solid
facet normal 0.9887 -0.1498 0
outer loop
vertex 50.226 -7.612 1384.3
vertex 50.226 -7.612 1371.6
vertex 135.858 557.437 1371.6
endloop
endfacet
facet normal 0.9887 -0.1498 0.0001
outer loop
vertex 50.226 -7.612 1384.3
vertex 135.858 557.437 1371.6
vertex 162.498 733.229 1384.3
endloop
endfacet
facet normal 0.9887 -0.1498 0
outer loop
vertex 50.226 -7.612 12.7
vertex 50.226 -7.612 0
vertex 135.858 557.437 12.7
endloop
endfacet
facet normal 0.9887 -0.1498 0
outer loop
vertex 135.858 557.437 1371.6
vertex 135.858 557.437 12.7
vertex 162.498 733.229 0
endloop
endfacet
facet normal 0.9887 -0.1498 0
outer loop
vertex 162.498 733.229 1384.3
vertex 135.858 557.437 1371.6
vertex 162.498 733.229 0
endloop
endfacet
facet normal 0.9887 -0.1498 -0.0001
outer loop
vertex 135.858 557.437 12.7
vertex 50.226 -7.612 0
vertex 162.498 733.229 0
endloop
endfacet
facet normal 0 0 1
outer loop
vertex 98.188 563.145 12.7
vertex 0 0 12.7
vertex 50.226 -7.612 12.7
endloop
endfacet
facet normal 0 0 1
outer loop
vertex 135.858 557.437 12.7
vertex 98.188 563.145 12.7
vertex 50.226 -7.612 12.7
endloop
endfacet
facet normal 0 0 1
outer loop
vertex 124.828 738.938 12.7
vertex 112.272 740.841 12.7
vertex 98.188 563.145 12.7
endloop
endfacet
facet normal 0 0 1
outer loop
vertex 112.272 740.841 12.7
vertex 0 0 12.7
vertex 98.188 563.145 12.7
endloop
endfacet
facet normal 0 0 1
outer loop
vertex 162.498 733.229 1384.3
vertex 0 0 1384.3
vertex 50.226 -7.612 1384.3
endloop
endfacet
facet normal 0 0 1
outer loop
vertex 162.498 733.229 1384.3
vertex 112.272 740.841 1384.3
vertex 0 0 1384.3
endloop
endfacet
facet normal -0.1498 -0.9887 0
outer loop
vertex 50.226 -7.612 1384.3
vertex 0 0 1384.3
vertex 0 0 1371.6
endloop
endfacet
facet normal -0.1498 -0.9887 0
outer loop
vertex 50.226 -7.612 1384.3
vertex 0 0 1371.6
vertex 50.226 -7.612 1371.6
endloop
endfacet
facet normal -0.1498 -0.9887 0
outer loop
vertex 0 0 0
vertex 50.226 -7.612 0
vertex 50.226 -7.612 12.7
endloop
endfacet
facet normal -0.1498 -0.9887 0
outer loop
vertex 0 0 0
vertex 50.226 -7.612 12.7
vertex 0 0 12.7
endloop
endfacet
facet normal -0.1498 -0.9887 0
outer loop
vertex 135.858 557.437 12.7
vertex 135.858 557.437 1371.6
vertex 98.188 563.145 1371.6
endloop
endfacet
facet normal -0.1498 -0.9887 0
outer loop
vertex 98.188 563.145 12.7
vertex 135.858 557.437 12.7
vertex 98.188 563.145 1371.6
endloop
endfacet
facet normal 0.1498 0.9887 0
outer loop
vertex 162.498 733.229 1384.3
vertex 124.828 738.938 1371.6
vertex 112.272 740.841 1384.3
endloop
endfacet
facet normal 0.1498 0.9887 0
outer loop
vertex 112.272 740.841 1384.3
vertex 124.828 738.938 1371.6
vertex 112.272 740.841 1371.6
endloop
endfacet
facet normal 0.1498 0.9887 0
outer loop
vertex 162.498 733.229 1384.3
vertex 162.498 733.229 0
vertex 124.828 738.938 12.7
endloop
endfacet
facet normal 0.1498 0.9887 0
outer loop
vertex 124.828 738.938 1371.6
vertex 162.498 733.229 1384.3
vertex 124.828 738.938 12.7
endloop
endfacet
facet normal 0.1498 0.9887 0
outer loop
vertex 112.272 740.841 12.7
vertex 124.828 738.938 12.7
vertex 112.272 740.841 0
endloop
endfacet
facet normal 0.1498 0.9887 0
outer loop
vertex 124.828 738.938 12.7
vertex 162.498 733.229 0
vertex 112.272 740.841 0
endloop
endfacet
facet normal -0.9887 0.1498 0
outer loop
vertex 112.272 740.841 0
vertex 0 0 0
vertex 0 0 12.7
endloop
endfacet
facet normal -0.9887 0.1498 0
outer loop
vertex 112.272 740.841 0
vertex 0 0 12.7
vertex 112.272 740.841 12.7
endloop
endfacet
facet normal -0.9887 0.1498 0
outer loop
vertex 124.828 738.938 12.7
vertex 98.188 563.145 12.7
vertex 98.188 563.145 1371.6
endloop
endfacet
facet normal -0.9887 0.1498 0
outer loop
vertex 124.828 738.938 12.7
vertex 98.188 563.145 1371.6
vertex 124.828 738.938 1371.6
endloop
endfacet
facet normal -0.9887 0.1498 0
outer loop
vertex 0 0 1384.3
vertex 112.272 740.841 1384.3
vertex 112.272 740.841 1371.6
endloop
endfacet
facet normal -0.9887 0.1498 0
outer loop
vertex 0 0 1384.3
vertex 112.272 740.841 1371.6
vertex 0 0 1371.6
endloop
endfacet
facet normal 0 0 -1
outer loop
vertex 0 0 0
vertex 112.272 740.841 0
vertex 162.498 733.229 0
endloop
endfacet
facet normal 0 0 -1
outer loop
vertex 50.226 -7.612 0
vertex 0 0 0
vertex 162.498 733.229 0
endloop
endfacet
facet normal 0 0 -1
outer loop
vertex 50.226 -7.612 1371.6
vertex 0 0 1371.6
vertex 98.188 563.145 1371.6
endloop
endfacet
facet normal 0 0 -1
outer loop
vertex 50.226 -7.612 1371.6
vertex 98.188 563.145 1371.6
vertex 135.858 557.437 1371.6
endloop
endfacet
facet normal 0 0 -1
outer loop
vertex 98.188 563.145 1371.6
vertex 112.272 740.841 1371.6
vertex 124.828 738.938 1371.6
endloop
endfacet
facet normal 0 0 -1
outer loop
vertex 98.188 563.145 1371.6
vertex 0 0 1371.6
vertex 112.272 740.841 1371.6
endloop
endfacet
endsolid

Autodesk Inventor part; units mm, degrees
ref_plane "YZ Plane" through (0, 0, 0) normal (1, 0, 0) x (0, 1, 0)
ref_plane "XZ Plane" through (0, 0, 0) normal (0, 1, 0) x (-1, 0, 0)
ref_plane "XY Plane" through (0, 0, 0) normal (0, 0, 1) x (1, 0, 0)
sketch "Sketch1" plane through (0, 0, 0) normal (0, 0, 1) x (1, 0, 0)
  line L0 (0, 0) -> (112.2718, 740.8411)
  line L1 (50.2265, -7.6116) -> (162.4983, 733.2294)
  line L2 (162.4983, 733.2294) -> (112.2718, 740.8411)
  line L3 (50.2265, -7.6116) -> (0, 0)
  line L4 (162.4983, 733.2294) -> (135.8576, 557.4366)
  line L5 (135.8576, 557.4366) -> (98.1877, 563.1454)
  line L6 (98.1877, 563.1454) -> (124.8285, 738.9382)
  line L7 (124.8285, 738.9382) -> (162.4983, 733.2294)
  dimension "d0" = 749.3
  dimension "d2" = 50.8
  dimension "d3" = 177.8
  dimension "d4" = 38.1
extrude "Extrusion1" add sketch "Sketch1" along normal blind 1384.3 contours L2 L1 L5 L6
extrude "Extrusion2" add sketch "Sketch1" along normal blind 12.7 contours L0 L2 L6 L5 L1 L3
sketch "Sketch2" plane through (0, 0, 1384.3) normal (0, 0, 1) x (1, 0, 0)
  line L0 (162.4983, 733.2294) -> (124.8285, 738.9382) projected
  line L1 (162.4983, 733.2294) -> (112.2718, 740.8411)
  line L2 (0, 0) -> (50.2265, -7.6116) projected
  line L3 (112.2718, 740.8411) -> (0, 0)
  line L4 (50.2265, -7.6116) -> (162.4983, 733.2294) projected
  line L5 (0, 0) -> (50.2265, -7.6116)
  line L6 (50.2265, -7.6116) -> (162.4983, 733.2294)
  line L7 (135.8576, 557.4366) -> (162.4983, 733.2294) projected
  line L8 (112.2718, 740.8411) -> (162.4983, 733.2294)
  line L9 (162.4983, 733.2294) -> (50.2265, -7.6116)
  dimension "d9" = 50.8
extrude "Extrusion3" add sketch "Sketch2" against normal blind 12.7
properties part number "BackRest"
